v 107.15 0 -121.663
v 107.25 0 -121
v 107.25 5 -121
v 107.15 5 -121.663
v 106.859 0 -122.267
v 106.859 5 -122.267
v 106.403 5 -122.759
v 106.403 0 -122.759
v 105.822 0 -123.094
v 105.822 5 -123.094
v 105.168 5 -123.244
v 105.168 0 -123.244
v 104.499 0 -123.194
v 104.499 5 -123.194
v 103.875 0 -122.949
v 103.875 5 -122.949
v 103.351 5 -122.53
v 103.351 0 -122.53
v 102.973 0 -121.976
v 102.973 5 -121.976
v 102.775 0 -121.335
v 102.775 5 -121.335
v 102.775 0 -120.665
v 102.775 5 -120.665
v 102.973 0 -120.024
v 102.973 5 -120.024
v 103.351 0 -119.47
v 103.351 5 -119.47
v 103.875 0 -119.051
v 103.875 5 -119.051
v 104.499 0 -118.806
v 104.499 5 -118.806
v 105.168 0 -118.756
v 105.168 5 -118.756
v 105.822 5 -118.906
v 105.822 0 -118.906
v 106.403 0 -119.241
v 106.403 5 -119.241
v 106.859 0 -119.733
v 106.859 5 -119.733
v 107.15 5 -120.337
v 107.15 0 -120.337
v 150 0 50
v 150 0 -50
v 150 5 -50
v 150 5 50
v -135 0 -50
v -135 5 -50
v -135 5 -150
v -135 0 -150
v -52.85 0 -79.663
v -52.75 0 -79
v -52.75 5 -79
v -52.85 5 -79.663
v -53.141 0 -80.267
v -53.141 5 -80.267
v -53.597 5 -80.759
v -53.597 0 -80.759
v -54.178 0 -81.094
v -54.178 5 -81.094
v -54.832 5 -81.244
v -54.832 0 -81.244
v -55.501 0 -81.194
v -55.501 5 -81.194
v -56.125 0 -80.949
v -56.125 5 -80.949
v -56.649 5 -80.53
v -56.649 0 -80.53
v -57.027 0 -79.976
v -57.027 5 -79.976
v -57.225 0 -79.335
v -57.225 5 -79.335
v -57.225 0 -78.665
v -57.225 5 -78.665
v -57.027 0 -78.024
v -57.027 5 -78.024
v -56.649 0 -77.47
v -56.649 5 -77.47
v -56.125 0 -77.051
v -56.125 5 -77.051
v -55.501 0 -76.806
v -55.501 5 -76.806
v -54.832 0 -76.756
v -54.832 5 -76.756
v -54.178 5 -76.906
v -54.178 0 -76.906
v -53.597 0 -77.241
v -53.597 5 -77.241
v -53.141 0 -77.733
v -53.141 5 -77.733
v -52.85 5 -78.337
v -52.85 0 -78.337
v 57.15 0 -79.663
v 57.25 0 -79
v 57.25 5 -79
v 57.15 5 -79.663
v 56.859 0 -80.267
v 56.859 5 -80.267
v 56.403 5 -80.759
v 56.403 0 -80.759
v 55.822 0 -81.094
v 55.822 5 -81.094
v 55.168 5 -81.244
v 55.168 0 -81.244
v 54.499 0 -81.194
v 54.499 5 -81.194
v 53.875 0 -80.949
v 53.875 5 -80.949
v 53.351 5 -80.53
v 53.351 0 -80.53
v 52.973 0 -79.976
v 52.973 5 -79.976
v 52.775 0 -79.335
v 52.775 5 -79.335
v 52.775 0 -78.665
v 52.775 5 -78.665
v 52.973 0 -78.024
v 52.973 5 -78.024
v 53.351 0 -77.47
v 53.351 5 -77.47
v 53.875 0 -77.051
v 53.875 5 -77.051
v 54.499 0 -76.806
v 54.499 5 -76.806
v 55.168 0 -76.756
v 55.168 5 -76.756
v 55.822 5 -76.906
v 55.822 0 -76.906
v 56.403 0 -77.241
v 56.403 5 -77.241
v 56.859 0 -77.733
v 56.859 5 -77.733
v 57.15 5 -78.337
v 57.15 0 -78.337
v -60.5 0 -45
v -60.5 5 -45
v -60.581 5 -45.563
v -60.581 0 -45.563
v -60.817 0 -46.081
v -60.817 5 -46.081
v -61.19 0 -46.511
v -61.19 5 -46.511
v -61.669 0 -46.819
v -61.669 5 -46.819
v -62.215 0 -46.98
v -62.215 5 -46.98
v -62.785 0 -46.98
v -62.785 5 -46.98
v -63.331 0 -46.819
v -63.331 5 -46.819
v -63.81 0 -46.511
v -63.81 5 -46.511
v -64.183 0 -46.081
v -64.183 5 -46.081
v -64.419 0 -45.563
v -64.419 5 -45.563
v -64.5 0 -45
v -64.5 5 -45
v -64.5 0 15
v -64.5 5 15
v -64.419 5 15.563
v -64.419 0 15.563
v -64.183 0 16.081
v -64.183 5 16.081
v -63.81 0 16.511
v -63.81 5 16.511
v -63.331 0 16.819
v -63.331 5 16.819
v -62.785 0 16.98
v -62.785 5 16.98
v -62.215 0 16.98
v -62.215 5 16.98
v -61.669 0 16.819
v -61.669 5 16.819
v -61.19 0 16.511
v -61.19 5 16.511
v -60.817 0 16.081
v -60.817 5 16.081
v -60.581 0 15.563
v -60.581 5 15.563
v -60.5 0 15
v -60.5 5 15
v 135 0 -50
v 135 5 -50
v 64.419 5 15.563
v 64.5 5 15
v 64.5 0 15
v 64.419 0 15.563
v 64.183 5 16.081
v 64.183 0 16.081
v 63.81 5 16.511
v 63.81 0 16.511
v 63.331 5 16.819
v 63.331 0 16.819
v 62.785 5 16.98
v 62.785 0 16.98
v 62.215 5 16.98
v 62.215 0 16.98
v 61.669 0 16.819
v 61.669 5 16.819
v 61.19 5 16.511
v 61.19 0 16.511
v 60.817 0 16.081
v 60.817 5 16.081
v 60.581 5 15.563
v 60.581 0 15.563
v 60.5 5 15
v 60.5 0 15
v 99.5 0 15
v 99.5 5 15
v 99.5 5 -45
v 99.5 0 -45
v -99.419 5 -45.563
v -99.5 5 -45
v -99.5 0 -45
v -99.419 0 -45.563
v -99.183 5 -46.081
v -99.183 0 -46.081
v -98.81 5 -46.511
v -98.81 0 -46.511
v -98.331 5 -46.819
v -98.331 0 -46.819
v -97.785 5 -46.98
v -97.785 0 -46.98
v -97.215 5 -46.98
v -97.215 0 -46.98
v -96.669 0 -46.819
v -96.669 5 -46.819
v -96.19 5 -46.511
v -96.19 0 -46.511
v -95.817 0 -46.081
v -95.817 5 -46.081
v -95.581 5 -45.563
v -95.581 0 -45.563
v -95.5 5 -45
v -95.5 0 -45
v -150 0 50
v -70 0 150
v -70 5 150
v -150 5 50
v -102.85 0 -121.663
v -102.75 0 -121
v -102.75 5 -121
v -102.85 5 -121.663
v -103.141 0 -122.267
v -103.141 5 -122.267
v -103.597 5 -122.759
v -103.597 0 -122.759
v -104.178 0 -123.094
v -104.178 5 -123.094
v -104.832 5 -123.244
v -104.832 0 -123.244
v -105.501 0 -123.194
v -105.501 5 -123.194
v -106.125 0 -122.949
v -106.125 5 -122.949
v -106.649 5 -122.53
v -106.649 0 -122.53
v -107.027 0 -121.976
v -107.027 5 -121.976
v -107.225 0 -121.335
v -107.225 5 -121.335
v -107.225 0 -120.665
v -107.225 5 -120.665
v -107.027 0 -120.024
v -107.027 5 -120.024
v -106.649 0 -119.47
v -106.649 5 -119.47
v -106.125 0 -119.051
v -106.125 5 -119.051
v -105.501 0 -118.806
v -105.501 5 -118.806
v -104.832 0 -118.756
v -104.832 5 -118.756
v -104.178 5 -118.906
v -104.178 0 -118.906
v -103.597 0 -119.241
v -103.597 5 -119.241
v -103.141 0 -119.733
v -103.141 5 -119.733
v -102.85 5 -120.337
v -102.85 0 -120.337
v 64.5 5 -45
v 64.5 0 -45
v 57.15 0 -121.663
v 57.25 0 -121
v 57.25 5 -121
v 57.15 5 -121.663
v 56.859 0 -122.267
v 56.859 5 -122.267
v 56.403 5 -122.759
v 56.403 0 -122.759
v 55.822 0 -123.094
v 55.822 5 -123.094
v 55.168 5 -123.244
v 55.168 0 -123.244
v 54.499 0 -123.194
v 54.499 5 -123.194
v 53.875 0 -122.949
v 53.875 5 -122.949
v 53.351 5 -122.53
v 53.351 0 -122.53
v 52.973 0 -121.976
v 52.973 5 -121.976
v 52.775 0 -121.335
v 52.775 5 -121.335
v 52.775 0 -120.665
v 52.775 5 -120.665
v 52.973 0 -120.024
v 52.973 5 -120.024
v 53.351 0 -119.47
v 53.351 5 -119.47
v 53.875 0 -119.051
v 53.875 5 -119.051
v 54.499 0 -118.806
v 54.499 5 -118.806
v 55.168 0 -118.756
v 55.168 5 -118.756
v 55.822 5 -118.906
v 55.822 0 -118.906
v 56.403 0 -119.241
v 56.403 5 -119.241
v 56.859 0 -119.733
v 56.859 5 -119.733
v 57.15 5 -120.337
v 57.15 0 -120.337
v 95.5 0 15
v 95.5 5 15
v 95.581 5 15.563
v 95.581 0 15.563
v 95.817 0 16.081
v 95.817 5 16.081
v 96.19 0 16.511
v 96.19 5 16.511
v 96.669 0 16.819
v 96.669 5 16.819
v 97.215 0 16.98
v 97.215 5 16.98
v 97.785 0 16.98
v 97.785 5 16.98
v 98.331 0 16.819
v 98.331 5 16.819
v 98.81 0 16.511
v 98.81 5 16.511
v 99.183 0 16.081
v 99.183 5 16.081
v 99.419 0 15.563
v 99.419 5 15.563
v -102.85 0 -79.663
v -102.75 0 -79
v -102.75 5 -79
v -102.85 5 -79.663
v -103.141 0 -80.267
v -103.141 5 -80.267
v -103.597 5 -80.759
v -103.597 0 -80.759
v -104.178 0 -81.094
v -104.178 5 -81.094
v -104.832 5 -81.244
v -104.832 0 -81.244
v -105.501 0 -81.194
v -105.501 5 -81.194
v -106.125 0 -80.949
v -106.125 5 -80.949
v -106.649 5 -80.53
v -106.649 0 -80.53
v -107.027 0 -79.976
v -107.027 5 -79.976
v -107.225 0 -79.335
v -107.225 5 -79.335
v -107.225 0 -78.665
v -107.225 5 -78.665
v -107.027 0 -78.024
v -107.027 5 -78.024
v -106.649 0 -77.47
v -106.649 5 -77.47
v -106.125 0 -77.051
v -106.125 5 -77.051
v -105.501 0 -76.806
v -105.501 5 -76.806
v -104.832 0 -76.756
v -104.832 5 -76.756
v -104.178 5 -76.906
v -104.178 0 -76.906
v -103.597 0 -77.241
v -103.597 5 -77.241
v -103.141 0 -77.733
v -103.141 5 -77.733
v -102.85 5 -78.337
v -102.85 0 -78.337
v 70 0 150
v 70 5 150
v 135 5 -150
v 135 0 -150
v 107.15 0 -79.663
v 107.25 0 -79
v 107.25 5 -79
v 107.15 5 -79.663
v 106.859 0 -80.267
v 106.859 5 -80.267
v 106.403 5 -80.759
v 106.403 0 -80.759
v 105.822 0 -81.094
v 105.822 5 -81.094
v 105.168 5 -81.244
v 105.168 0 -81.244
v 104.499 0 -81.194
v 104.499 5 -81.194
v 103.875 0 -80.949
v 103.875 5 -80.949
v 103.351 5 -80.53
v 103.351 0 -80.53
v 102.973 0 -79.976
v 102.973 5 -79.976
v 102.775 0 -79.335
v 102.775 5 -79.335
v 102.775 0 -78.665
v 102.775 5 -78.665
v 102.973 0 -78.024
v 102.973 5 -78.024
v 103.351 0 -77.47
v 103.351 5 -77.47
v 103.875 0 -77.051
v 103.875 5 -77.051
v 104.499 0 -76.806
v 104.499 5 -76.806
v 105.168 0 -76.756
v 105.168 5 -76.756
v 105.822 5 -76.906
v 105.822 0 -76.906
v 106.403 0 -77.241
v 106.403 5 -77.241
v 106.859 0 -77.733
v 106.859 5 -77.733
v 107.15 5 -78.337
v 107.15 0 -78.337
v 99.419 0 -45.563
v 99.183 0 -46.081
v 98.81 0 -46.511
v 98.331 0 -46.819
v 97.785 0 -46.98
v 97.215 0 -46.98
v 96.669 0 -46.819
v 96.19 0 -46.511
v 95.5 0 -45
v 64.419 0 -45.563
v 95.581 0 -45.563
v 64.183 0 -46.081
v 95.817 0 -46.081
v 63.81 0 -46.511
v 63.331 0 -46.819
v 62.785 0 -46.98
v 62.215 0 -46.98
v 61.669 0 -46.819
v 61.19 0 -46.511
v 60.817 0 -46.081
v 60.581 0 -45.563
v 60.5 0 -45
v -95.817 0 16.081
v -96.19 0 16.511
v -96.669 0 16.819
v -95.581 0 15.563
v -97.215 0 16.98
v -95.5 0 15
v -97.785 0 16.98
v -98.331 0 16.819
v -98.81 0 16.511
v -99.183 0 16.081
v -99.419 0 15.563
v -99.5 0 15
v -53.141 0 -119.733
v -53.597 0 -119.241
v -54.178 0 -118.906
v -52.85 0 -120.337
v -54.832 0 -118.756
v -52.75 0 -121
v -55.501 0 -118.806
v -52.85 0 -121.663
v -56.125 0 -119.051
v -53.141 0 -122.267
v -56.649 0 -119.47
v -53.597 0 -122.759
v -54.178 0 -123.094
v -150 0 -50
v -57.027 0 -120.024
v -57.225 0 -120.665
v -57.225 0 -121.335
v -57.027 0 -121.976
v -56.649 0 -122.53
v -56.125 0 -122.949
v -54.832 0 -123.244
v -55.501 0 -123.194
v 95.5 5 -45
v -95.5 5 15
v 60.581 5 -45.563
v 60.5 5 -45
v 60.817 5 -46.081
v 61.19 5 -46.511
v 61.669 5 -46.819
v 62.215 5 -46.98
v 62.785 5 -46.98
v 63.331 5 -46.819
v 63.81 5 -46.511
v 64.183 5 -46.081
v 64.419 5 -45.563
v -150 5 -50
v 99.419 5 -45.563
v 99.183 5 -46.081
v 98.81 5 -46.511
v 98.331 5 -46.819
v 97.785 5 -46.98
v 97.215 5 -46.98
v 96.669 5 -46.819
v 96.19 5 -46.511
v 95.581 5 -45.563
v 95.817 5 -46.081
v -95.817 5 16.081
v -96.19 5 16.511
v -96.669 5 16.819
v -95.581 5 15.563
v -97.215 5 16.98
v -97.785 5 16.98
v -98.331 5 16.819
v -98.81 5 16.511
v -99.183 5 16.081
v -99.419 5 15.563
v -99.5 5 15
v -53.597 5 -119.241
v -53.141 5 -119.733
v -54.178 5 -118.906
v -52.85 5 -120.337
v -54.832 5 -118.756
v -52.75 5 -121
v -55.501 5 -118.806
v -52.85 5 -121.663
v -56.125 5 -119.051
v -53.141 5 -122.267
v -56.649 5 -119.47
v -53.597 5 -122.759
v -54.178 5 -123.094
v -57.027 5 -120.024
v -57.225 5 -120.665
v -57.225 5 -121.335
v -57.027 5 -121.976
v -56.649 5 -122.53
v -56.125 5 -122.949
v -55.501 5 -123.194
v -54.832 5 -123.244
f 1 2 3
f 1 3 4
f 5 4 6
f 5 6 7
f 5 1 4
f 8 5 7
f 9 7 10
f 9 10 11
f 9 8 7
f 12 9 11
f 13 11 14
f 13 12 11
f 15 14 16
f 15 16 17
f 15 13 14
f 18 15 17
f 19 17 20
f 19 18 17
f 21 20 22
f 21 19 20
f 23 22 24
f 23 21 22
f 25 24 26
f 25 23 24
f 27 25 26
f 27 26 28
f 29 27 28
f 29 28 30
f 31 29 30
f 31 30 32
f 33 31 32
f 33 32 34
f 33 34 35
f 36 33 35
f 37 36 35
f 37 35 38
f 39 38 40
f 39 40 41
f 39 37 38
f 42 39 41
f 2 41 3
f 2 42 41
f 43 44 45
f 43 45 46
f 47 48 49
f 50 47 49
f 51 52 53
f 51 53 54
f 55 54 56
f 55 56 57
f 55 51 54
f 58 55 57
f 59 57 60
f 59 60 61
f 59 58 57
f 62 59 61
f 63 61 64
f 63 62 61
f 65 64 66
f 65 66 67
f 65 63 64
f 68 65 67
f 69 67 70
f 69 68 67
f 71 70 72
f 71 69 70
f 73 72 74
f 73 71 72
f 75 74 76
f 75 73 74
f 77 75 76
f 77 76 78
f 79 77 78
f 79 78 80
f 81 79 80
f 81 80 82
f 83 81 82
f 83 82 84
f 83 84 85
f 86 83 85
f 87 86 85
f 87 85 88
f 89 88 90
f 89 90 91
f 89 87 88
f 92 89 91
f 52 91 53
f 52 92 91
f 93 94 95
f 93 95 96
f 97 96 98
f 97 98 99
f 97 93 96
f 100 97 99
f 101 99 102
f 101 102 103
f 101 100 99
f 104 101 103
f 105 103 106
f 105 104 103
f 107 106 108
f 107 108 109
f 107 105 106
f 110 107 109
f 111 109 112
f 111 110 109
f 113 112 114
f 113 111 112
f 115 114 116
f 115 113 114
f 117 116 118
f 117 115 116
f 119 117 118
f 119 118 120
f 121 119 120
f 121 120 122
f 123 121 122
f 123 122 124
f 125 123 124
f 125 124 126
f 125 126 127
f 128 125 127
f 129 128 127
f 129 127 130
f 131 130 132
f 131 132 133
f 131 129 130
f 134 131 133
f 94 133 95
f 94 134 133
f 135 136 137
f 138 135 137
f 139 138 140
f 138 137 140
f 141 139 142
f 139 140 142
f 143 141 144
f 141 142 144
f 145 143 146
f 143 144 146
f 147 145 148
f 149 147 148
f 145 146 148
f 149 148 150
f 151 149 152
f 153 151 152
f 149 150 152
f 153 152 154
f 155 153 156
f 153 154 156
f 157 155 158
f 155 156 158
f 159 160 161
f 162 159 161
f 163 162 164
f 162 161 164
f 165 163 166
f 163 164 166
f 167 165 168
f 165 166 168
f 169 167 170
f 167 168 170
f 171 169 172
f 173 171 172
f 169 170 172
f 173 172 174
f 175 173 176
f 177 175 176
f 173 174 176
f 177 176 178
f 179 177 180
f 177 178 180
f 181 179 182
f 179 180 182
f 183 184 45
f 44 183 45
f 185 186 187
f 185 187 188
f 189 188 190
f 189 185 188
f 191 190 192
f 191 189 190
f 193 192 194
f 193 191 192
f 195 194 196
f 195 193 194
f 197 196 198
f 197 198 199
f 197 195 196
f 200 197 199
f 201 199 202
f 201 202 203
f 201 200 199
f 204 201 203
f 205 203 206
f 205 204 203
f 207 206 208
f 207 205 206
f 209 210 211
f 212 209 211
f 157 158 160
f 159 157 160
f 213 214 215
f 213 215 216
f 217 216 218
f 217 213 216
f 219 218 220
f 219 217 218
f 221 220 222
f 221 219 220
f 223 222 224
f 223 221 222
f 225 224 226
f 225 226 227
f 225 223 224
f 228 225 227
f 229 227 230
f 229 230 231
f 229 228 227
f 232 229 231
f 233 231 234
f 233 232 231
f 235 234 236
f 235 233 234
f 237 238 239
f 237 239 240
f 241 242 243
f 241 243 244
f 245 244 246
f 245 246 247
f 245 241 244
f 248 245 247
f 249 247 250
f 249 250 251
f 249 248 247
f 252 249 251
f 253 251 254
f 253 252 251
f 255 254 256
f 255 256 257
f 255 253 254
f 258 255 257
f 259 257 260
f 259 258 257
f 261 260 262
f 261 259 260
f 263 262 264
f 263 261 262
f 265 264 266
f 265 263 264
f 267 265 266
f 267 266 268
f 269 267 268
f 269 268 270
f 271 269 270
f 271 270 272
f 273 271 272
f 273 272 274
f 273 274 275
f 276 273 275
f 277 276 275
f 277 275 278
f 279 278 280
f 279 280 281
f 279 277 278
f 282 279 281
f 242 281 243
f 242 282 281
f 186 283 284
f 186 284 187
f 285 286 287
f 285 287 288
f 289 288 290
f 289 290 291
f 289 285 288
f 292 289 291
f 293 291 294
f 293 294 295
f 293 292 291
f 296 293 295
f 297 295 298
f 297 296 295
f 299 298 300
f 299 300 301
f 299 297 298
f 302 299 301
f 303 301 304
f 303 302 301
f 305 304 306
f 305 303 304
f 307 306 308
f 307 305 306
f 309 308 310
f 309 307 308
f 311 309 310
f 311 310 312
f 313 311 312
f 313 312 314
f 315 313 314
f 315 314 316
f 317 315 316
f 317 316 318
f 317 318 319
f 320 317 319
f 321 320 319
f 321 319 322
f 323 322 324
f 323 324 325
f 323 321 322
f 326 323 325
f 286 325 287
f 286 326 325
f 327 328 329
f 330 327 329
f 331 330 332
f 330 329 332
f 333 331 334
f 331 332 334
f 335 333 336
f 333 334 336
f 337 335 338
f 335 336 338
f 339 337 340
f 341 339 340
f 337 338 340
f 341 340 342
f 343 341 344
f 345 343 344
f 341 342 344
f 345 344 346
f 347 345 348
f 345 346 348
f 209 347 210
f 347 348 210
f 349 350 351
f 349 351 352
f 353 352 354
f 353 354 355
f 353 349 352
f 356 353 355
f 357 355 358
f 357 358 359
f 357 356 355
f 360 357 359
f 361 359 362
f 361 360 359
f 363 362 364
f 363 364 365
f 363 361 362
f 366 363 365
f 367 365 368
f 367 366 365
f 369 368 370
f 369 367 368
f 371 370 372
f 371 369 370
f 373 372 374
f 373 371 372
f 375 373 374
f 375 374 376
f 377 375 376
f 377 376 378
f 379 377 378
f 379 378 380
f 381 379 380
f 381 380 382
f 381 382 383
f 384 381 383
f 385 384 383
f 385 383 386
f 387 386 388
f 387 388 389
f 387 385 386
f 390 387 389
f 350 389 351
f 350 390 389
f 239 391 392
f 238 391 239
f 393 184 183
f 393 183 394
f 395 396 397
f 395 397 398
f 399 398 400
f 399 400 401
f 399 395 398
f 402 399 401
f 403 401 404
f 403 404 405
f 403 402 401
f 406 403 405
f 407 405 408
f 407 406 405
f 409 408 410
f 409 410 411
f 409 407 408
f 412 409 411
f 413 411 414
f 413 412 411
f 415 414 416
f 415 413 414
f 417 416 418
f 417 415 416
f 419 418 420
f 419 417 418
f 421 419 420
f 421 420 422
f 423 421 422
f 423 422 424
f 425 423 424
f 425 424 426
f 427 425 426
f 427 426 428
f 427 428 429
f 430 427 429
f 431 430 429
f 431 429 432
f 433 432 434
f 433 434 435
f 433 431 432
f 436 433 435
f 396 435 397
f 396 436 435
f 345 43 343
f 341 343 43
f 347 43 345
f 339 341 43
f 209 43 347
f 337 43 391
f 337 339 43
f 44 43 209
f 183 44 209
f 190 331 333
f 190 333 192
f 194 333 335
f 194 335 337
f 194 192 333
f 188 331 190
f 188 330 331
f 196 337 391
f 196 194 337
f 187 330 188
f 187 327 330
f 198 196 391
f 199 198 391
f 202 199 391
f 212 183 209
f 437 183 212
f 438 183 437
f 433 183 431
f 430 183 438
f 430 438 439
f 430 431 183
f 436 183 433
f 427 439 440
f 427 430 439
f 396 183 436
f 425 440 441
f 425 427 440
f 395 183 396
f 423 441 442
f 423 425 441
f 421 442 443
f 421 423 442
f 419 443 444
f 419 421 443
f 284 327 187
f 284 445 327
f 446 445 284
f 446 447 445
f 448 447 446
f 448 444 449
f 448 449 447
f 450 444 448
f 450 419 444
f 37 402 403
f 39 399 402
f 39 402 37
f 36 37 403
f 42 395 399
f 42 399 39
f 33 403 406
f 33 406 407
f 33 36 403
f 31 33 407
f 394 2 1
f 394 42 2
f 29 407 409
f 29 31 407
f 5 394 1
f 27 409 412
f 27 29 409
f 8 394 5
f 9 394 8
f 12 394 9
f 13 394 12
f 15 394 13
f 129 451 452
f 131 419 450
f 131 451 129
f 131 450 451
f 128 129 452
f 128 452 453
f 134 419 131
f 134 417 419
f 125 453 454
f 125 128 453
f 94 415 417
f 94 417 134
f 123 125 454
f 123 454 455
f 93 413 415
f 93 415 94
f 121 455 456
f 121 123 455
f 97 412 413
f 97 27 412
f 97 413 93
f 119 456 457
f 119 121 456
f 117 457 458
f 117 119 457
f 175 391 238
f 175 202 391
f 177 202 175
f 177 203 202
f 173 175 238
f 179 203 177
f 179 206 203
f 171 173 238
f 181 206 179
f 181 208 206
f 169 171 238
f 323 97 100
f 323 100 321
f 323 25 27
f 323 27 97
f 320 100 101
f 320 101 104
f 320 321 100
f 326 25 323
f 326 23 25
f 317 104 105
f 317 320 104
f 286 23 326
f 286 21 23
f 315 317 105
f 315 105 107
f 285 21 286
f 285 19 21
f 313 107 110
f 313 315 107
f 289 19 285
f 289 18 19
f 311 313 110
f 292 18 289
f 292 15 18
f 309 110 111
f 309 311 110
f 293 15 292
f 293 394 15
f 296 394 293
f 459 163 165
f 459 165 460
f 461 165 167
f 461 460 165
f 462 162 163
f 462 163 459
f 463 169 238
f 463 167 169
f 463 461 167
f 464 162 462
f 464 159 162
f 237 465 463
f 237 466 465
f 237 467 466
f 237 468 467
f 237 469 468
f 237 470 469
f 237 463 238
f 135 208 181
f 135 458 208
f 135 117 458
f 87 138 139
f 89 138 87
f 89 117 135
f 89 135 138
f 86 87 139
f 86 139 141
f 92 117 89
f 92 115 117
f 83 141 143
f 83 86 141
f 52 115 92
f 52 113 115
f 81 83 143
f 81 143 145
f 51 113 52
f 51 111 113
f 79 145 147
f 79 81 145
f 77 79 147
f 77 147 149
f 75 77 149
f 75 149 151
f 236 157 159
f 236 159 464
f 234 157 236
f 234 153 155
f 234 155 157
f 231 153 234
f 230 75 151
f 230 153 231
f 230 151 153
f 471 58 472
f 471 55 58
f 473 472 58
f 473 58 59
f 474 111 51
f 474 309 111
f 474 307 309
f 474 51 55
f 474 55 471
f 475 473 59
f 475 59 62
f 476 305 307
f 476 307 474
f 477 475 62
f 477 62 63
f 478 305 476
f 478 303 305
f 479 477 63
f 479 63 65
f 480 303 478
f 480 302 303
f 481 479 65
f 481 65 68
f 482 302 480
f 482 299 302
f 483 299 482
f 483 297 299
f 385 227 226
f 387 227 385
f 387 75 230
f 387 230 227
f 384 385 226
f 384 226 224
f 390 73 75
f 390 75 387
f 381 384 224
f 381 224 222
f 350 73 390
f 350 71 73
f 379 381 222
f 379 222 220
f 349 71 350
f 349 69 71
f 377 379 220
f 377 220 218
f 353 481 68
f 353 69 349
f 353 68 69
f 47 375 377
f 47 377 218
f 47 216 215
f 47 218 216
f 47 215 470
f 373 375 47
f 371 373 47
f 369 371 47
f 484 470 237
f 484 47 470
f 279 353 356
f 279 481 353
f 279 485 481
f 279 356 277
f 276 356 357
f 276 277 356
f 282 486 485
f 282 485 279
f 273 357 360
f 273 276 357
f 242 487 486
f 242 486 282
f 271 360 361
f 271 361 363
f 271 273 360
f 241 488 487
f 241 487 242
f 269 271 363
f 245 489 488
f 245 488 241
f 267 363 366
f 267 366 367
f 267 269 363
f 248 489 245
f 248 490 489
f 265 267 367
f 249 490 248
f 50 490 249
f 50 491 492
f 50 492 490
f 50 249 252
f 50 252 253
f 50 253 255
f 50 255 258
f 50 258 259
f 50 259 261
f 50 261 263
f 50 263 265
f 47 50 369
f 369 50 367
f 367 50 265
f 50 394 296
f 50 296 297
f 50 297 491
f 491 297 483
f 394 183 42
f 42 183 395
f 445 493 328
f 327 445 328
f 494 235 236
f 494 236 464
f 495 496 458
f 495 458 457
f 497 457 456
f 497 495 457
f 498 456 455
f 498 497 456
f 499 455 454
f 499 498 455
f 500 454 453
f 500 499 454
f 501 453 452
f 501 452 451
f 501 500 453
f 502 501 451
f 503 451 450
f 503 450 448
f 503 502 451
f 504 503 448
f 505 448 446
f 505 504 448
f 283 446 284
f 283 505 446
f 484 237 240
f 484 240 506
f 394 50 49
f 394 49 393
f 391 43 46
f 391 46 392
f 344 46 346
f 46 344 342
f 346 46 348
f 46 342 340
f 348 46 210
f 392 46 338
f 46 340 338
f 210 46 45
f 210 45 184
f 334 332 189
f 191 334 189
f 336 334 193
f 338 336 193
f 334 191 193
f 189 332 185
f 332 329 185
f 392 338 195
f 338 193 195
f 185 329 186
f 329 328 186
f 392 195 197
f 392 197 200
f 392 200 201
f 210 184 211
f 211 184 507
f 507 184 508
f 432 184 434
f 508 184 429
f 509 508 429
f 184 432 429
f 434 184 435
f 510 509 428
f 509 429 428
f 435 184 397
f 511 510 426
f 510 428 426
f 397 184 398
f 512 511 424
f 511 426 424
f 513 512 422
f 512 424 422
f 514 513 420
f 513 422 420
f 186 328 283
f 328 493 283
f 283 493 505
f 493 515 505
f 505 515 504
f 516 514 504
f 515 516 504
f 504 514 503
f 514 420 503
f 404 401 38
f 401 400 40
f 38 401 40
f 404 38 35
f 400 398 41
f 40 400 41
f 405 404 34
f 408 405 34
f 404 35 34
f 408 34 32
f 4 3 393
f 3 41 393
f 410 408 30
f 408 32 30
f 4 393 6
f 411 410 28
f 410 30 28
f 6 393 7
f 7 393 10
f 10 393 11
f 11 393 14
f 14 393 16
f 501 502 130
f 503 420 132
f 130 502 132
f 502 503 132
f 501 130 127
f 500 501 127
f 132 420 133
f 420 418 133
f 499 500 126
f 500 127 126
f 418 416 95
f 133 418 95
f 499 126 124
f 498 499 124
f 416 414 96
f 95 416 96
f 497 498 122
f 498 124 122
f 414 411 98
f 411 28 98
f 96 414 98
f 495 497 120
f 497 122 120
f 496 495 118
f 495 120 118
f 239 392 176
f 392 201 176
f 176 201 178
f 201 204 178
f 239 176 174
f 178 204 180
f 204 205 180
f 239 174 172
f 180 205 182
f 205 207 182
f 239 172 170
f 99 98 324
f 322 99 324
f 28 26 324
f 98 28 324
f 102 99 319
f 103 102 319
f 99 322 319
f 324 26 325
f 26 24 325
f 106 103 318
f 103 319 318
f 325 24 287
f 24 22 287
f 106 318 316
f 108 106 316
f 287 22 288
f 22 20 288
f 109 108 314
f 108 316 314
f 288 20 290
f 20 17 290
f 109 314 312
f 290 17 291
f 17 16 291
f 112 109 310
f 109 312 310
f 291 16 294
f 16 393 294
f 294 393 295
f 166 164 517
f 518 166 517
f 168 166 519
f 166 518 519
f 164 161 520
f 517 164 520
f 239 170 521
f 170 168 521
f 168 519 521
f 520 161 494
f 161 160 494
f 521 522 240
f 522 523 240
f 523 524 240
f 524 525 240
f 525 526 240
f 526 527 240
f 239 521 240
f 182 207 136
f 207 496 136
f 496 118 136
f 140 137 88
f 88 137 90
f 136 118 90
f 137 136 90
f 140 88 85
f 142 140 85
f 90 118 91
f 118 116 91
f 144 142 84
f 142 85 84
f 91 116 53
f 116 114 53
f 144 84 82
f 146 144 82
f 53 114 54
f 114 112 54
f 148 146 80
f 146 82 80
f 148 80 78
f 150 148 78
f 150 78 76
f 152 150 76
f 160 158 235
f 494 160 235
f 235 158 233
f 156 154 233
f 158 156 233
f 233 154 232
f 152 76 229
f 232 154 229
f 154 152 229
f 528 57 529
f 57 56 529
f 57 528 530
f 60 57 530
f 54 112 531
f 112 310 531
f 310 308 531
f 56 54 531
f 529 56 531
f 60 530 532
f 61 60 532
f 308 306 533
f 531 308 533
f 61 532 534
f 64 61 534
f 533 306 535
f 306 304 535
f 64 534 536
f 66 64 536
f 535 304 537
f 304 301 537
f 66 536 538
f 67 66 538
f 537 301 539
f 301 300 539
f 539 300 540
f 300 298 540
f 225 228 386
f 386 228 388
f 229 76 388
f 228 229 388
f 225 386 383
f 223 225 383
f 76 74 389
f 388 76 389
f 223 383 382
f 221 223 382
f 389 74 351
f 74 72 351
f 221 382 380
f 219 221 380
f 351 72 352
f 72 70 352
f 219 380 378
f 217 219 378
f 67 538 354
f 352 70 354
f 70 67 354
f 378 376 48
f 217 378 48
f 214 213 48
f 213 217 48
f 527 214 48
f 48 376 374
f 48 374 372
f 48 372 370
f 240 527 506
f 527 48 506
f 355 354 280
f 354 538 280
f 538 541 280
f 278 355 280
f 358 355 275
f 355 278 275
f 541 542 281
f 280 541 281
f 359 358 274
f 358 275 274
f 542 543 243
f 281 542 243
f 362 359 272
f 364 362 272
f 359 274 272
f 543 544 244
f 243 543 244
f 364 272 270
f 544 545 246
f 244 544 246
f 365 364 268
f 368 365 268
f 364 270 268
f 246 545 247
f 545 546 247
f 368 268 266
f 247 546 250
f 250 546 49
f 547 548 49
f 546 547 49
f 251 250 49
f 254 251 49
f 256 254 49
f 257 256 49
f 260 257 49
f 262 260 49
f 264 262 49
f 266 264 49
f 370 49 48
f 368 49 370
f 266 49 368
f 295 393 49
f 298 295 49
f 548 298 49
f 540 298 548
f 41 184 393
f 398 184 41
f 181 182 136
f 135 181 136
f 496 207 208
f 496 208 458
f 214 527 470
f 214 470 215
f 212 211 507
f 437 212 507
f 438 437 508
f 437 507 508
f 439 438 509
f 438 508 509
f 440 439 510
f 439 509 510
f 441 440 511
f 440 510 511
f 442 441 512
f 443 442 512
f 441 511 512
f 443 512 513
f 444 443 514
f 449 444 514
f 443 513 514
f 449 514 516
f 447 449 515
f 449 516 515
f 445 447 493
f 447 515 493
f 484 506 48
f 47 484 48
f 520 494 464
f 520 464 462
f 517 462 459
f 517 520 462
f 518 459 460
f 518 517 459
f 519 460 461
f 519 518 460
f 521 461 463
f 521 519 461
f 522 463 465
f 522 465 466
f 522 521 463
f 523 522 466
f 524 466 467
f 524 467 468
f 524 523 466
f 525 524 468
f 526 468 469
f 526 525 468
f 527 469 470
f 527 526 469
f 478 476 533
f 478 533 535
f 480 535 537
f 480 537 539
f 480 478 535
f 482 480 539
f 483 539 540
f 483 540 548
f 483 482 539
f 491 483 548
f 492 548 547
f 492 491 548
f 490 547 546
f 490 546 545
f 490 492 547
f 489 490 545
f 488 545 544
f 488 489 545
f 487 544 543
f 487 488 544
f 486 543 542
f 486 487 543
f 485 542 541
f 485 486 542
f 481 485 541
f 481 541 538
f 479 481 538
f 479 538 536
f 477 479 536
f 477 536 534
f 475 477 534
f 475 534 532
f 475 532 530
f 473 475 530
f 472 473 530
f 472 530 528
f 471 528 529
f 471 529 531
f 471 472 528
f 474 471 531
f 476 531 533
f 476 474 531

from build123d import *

# Parameters (mm, degrees)
SKETCH_2_R          = 2.25
EXTRUDE_2_DEPTH     = 5
SKETCH_3_W          = 15
SKETCH_3_H          = 100
CUT_EXTRUDE_1_DEPTH = 5
CUT_EXTRUDE_2_DEPTH = 5


with BuildPart() as part:
    # 草圖2 → 填料-伸長2 (new body)
    with BuildSketch(Plane(origin=(0, 0, 0), x_dir=(1, 0, 0), z_dir=(0, 1, 0))):
        Polygon((-150, 150), (150, 150), (150, -50), (70, -150), (-70, -150), (-150, -50), align=None)
        with Locations((-105, 121)):
            Circle(SKETCH_2_R, mode=Mode.SUBTRACT)
        with Locations((-105, 79)):
            Circle(SKETCH_2_R, mode=Mode.SUBTRACT)
        with Locations((-55, 79)):
            Circle(SKETCH_2_R, mode=Mode.SUBTRACT)
        with Locations((-55, 121)):
            Circle(SKETCH_2_R, mode=Mode.SUBTRACT)
        with Locations((55, 121)):
            Circle(SKETCH_2_R, mode=Mode.SUBTRACT)
        with Locations((55, 79)):
            Circle(SKETCH_2_R, mode=Mode.SUBTRACT)
        with Locations((105, 121)):
            Circle(SKETCH_2_R, mode=Mode.SUBTRACT)
        with Locations((105, 79)):
            Circle(SKETCH_2_R, mode=Mode.SUBTRACT)
    extrude(amount=EXTRUDE_2_DEPTH)

    # 草圖3 → 除料-伸長1 (cut)
    with BuildSketch(Plane(origin=(0, 5, 0), x_dir=(1, 0, 0), z_dir=(0, 1, 0))):
        with Locations((-142.5, 100)):
            Rectangle(SKETCH_3_W, SKETCH_3_H)
        with Locations((142.5, 100)):
            Rectangle(SKETCH_3_W, SKETCH_3_H)
    extrude(amount=-CUT_EXTRUDE_1_DEPTH, mode=Mode.SUBTRACT)

    # 草圖4 → 除料-伸長2 (cut)
    with BuildSketch(Plane(origin=(0, 5, 0), x_dir=(1, 0, 0), z_dir=(0, 1, 0))):
        with BuildLine():
            Line((-95.5, 45), (-95.5, -15))
            ThreePointArc((-95.5, -15), (-97.5, -17), (-99.5, -15))
            Line((-99.5, -15), (-99.5, 45))
            ThreePointArc((-99.5, 45), (-97.5, 47), (-95.5, 45))
        make_face()
        with BuildLine():
            Line((-64.5, 45), (-64.5, -15))
            ThreePointArc((-64.5, -15), (-62.5, -17), (-60.5, -15))
            Line((-60.5, -15), (-60.5, 45))
            ThreePointArc((-60.5, 45), (-62.5, 47), (-64.5, 45))
        make_face()
        with BuildLine():
            Line((95.5, 45), (95.5, -15))
            ThreePointArc((95.5, -15), (97.5, -17), (99.5, -15))
            Line((99.5, -15), (99.5, 45))
            ThreePointArc((99.5, 45), (97.5, 47), (95.5, 45))
        make_face()
        with BuildLine():
            Line((64.5, 45), (64.5, -15))
            ThreePointArc((64.5, -15), (62.5, -17), (60.5, -15))
            Line((60.5, -15), (60.5, 45))
            ThreePointArc((60.5, 45), (62.5, 47), (64.5, 45))
        make_face()
    extrude(amount=-CUT_EXTRUDE_2_DEPTH, mode=Mode.SUBTRACT)


solid = part.part
